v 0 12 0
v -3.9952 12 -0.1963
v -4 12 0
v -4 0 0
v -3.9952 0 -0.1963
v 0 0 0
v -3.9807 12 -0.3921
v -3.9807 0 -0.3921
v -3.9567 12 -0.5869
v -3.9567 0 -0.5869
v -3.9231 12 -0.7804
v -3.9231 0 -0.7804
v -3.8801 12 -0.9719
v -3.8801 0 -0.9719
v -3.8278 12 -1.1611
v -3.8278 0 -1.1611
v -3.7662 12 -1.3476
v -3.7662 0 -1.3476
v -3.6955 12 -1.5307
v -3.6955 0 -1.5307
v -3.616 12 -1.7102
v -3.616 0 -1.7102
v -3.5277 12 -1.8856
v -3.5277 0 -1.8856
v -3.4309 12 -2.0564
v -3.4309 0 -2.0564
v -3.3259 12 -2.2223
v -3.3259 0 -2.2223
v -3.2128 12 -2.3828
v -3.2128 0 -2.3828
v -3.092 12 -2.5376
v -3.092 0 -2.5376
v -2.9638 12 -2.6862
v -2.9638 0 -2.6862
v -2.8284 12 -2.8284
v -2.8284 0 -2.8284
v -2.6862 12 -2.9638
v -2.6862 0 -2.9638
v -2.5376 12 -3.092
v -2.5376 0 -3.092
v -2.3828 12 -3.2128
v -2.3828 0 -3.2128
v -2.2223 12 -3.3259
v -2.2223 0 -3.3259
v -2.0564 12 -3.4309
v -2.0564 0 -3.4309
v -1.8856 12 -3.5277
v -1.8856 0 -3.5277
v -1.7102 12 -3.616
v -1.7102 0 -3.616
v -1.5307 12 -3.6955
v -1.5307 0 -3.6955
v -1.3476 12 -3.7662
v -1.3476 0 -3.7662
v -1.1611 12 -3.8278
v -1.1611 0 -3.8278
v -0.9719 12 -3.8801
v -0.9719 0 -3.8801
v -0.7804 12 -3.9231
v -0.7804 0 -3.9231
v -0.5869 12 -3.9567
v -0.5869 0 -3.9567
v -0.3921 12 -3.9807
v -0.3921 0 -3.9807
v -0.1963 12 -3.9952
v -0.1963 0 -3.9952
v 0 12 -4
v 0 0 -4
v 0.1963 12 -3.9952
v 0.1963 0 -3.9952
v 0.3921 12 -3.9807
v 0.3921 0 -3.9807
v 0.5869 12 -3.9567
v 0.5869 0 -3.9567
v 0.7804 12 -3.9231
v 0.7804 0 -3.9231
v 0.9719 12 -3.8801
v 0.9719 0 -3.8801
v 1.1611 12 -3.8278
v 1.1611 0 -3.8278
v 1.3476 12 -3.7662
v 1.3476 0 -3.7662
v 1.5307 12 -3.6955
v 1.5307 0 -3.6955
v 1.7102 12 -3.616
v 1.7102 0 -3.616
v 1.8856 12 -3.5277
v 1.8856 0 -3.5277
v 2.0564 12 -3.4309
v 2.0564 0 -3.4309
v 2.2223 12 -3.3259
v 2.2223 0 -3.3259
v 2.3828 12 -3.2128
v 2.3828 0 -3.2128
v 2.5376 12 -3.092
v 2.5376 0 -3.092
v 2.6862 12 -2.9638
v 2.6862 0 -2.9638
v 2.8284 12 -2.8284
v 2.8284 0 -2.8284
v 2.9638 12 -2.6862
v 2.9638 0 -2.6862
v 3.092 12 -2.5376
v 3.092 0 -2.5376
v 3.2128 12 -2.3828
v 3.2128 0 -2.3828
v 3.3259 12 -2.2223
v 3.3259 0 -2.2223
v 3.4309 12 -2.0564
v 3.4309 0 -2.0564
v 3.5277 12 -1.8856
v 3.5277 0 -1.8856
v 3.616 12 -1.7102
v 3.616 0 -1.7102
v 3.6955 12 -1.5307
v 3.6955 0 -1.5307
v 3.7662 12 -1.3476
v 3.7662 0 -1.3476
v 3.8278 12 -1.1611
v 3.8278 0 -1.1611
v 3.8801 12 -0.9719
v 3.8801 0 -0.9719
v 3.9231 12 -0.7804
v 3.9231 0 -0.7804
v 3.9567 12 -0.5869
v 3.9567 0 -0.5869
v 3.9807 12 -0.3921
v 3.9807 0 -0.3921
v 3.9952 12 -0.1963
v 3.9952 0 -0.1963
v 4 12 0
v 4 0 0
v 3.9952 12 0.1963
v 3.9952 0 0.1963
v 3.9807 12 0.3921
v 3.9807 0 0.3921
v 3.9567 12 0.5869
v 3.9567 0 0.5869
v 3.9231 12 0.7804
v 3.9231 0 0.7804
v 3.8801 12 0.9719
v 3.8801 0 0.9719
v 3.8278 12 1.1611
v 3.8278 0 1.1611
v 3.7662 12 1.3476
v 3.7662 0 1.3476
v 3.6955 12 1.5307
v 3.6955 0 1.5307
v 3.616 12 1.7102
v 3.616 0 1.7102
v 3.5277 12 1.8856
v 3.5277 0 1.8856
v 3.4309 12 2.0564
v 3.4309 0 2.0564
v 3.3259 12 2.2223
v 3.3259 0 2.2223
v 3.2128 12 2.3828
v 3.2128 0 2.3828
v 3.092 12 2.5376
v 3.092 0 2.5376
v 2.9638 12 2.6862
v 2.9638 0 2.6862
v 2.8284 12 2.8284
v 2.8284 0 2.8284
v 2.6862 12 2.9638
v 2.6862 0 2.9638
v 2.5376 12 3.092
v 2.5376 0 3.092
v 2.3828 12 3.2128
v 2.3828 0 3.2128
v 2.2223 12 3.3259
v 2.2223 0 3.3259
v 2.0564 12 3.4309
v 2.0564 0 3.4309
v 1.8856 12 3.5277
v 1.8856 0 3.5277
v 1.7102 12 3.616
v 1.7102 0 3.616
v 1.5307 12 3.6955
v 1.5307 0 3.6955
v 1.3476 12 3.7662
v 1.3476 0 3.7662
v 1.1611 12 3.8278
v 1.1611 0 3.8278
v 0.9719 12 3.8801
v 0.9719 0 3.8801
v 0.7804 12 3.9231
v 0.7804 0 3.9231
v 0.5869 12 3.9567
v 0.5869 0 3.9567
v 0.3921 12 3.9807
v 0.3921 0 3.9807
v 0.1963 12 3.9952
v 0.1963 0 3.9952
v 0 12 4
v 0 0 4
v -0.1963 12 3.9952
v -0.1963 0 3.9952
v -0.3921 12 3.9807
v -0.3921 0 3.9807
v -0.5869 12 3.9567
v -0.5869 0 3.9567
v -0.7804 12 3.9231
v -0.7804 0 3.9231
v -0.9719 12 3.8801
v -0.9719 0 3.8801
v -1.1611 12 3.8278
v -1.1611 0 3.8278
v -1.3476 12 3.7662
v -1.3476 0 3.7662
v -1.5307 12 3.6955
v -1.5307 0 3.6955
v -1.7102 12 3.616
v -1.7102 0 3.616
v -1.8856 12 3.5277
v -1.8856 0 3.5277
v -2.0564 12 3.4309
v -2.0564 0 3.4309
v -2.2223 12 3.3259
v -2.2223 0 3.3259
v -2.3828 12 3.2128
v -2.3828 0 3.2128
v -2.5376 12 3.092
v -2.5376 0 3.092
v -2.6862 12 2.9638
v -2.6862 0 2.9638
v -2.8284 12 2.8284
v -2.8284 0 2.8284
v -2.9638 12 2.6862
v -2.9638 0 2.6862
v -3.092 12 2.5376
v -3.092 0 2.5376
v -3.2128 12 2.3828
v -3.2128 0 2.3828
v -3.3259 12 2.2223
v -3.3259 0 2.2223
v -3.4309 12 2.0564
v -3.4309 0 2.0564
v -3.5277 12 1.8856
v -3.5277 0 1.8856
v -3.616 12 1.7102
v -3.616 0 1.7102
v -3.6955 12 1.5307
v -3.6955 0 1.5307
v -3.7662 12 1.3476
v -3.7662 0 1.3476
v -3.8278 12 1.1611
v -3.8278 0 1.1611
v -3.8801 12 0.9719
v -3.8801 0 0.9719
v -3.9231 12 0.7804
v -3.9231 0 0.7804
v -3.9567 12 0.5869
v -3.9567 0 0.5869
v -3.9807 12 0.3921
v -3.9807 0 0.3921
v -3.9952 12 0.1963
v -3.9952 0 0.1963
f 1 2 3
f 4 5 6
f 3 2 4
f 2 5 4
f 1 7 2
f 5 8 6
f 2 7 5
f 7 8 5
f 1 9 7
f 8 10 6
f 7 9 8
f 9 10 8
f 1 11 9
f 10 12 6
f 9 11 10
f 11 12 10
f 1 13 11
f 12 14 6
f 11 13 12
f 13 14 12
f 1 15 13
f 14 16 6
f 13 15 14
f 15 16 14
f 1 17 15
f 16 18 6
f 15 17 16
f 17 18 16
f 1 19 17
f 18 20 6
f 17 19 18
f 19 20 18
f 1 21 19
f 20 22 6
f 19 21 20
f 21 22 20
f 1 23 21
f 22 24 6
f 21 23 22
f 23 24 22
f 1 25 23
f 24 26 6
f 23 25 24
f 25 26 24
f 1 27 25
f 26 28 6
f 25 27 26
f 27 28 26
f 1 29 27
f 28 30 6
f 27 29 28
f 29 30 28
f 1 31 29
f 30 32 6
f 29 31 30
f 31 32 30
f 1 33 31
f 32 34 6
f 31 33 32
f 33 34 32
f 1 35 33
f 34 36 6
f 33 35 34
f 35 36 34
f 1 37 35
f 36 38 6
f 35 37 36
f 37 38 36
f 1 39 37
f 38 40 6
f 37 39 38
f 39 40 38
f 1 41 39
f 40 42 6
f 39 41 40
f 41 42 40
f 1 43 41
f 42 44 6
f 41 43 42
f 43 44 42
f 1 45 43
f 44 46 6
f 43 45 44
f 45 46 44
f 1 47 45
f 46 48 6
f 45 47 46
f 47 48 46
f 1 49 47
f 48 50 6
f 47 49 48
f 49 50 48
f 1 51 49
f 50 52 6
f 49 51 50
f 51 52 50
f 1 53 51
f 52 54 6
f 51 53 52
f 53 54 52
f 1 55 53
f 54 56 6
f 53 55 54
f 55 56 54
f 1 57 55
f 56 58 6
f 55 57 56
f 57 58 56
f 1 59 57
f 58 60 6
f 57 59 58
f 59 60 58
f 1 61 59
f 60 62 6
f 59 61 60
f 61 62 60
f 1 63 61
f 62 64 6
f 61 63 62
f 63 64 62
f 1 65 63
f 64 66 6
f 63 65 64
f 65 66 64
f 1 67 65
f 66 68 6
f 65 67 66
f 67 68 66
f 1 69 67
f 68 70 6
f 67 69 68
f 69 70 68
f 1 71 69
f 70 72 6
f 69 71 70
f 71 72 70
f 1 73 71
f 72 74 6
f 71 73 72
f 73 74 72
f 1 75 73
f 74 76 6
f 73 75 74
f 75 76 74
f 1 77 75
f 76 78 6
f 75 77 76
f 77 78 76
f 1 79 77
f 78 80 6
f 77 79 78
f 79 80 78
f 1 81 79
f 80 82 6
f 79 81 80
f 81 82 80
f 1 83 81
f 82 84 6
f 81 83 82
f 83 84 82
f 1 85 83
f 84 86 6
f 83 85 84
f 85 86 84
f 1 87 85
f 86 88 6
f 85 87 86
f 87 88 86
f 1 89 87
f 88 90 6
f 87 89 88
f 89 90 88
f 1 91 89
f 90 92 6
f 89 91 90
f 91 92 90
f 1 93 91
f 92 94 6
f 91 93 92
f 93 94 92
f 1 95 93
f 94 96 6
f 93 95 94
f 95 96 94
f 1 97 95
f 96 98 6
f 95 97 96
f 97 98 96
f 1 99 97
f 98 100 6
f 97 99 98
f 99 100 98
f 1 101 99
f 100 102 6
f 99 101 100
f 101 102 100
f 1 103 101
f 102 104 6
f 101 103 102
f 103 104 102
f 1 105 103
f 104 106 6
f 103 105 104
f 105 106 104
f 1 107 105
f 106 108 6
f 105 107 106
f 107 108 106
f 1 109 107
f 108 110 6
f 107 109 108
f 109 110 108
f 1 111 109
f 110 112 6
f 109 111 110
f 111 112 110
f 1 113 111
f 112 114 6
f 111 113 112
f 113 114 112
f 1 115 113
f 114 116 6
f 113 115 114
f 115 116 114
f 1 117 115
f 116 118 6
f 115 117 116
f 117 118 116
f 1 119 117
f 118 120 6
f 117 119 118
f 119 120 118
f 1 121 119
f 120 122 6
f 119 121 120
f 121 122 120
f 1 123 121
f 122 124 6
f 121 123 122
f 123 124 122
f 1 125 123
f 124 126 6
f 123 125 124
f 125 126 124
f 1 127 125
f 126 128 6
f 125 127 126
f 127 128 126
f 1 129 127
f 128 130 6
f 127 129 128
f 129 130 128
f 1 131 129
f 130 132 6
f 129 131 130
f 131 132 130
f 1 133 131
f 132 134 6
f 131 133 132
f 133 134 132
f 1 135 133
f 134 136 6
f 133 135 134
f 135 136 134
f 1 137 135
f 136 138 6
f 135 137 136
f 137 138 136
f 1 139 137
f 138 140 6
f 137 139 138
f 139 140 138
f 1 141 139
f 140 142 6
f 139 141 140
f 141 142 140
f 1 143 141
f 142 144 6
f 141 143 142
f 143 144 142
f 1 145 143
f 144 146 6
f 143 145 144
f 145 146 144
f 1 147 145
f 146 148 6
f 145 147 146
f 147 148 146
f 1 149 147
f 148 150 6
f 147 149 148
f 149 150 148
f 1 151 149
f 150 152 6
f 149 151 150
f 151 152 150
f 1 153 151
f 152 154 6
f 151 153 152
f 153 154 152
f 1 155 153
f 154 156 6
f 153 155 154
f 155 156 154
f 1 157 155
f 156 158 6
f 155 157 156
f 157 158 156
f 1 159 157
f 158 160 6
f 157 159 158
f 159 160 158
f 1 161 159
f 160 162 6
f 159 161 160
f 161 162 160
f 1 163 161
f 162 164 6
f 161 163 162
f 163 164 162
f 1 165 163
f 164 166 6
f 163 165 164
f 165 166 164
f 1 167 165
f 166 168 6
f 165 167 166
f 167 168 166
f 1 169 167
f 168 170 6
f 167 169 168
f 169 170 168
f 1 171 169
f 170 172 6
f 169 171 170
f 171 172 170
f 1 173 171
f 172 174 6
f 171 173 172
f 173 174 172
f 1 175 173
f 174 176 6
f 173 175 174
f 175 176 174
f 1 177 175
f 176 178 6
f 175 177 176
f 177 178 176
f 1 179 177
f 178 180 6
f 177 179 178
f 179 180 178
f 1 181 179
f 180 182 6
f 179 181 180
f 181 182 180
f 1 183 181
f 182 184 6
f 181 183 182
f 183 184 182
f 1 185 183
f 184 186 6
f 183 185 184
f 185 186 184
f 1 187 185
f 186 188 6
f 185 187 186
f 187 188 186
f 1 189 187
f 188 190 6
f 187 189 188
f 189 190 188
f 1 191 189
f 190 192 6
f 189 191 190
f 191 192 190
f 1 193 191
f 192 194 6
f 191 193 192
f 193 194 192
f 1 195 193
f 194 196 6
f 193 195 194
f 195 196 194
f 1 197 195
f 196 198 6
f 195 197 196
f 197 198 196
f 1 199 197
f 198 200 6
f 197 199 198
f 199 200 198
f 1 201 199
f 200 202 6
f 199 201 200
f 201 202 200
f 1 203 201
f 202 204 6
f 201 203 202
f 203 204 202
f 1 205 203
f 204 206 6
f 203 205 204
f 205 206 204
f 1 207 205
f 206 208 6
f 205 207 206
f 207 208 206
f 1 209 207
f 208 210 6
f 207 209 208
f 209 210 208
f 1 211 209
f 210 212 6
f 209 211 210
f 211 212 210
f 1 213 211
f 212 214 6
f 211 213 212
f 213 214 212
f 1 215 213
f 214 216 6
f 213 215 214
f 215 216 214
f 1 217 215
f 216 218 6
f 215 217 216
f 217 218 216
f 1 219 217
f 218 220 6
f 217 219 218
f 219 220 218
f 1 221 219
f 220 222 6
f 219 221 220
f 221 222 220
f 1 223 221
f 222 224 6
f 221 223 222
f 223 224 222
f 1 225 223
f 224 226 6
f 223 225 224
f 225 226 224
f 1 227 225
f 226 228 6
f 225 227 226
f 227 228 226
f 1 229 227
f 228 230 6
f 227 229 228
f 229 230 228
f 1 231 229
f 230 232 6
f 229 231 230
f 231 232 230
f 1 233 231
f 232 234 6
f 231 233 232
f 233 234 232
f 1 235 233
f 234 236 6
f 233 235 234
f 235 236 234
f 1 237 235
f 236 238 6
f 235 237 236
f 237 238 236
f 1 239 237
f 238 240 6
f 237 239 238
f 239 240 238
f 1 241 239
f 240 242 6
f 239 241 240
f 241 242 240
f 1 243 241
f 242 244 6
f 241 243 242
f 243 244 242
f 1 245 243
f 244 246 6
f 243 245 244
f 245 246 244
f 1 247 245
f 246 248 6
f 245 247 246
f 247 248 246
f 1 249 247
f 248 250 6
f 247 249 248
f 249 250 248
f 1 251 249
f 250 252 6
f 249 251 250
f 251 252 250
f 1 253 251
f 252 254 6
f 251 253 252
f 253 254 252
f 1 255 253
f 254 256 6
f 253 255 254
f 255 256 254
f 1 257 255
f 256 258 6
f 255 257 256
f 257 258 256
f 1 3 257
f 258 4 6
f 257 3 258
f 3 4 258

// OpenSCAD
// Auto-generated from tests/data/feature_fixtures_manifest.json
// fixture: revolve_y_axis
// fixture_type: revolve
// description: Rectangle profile revolved around Y axis; Phase 2 cylinder primitive upgrade.
$fn = 96;

profile = [
    [0.000000, 0.000000],
    [4.000000, 0.000000],
    [4.000000, 12.000000],
    [0.000000, 12.000000]
];

rotate([-90, 0, 0]) rotate_extrude($fn=128) polygon(points=profile);
